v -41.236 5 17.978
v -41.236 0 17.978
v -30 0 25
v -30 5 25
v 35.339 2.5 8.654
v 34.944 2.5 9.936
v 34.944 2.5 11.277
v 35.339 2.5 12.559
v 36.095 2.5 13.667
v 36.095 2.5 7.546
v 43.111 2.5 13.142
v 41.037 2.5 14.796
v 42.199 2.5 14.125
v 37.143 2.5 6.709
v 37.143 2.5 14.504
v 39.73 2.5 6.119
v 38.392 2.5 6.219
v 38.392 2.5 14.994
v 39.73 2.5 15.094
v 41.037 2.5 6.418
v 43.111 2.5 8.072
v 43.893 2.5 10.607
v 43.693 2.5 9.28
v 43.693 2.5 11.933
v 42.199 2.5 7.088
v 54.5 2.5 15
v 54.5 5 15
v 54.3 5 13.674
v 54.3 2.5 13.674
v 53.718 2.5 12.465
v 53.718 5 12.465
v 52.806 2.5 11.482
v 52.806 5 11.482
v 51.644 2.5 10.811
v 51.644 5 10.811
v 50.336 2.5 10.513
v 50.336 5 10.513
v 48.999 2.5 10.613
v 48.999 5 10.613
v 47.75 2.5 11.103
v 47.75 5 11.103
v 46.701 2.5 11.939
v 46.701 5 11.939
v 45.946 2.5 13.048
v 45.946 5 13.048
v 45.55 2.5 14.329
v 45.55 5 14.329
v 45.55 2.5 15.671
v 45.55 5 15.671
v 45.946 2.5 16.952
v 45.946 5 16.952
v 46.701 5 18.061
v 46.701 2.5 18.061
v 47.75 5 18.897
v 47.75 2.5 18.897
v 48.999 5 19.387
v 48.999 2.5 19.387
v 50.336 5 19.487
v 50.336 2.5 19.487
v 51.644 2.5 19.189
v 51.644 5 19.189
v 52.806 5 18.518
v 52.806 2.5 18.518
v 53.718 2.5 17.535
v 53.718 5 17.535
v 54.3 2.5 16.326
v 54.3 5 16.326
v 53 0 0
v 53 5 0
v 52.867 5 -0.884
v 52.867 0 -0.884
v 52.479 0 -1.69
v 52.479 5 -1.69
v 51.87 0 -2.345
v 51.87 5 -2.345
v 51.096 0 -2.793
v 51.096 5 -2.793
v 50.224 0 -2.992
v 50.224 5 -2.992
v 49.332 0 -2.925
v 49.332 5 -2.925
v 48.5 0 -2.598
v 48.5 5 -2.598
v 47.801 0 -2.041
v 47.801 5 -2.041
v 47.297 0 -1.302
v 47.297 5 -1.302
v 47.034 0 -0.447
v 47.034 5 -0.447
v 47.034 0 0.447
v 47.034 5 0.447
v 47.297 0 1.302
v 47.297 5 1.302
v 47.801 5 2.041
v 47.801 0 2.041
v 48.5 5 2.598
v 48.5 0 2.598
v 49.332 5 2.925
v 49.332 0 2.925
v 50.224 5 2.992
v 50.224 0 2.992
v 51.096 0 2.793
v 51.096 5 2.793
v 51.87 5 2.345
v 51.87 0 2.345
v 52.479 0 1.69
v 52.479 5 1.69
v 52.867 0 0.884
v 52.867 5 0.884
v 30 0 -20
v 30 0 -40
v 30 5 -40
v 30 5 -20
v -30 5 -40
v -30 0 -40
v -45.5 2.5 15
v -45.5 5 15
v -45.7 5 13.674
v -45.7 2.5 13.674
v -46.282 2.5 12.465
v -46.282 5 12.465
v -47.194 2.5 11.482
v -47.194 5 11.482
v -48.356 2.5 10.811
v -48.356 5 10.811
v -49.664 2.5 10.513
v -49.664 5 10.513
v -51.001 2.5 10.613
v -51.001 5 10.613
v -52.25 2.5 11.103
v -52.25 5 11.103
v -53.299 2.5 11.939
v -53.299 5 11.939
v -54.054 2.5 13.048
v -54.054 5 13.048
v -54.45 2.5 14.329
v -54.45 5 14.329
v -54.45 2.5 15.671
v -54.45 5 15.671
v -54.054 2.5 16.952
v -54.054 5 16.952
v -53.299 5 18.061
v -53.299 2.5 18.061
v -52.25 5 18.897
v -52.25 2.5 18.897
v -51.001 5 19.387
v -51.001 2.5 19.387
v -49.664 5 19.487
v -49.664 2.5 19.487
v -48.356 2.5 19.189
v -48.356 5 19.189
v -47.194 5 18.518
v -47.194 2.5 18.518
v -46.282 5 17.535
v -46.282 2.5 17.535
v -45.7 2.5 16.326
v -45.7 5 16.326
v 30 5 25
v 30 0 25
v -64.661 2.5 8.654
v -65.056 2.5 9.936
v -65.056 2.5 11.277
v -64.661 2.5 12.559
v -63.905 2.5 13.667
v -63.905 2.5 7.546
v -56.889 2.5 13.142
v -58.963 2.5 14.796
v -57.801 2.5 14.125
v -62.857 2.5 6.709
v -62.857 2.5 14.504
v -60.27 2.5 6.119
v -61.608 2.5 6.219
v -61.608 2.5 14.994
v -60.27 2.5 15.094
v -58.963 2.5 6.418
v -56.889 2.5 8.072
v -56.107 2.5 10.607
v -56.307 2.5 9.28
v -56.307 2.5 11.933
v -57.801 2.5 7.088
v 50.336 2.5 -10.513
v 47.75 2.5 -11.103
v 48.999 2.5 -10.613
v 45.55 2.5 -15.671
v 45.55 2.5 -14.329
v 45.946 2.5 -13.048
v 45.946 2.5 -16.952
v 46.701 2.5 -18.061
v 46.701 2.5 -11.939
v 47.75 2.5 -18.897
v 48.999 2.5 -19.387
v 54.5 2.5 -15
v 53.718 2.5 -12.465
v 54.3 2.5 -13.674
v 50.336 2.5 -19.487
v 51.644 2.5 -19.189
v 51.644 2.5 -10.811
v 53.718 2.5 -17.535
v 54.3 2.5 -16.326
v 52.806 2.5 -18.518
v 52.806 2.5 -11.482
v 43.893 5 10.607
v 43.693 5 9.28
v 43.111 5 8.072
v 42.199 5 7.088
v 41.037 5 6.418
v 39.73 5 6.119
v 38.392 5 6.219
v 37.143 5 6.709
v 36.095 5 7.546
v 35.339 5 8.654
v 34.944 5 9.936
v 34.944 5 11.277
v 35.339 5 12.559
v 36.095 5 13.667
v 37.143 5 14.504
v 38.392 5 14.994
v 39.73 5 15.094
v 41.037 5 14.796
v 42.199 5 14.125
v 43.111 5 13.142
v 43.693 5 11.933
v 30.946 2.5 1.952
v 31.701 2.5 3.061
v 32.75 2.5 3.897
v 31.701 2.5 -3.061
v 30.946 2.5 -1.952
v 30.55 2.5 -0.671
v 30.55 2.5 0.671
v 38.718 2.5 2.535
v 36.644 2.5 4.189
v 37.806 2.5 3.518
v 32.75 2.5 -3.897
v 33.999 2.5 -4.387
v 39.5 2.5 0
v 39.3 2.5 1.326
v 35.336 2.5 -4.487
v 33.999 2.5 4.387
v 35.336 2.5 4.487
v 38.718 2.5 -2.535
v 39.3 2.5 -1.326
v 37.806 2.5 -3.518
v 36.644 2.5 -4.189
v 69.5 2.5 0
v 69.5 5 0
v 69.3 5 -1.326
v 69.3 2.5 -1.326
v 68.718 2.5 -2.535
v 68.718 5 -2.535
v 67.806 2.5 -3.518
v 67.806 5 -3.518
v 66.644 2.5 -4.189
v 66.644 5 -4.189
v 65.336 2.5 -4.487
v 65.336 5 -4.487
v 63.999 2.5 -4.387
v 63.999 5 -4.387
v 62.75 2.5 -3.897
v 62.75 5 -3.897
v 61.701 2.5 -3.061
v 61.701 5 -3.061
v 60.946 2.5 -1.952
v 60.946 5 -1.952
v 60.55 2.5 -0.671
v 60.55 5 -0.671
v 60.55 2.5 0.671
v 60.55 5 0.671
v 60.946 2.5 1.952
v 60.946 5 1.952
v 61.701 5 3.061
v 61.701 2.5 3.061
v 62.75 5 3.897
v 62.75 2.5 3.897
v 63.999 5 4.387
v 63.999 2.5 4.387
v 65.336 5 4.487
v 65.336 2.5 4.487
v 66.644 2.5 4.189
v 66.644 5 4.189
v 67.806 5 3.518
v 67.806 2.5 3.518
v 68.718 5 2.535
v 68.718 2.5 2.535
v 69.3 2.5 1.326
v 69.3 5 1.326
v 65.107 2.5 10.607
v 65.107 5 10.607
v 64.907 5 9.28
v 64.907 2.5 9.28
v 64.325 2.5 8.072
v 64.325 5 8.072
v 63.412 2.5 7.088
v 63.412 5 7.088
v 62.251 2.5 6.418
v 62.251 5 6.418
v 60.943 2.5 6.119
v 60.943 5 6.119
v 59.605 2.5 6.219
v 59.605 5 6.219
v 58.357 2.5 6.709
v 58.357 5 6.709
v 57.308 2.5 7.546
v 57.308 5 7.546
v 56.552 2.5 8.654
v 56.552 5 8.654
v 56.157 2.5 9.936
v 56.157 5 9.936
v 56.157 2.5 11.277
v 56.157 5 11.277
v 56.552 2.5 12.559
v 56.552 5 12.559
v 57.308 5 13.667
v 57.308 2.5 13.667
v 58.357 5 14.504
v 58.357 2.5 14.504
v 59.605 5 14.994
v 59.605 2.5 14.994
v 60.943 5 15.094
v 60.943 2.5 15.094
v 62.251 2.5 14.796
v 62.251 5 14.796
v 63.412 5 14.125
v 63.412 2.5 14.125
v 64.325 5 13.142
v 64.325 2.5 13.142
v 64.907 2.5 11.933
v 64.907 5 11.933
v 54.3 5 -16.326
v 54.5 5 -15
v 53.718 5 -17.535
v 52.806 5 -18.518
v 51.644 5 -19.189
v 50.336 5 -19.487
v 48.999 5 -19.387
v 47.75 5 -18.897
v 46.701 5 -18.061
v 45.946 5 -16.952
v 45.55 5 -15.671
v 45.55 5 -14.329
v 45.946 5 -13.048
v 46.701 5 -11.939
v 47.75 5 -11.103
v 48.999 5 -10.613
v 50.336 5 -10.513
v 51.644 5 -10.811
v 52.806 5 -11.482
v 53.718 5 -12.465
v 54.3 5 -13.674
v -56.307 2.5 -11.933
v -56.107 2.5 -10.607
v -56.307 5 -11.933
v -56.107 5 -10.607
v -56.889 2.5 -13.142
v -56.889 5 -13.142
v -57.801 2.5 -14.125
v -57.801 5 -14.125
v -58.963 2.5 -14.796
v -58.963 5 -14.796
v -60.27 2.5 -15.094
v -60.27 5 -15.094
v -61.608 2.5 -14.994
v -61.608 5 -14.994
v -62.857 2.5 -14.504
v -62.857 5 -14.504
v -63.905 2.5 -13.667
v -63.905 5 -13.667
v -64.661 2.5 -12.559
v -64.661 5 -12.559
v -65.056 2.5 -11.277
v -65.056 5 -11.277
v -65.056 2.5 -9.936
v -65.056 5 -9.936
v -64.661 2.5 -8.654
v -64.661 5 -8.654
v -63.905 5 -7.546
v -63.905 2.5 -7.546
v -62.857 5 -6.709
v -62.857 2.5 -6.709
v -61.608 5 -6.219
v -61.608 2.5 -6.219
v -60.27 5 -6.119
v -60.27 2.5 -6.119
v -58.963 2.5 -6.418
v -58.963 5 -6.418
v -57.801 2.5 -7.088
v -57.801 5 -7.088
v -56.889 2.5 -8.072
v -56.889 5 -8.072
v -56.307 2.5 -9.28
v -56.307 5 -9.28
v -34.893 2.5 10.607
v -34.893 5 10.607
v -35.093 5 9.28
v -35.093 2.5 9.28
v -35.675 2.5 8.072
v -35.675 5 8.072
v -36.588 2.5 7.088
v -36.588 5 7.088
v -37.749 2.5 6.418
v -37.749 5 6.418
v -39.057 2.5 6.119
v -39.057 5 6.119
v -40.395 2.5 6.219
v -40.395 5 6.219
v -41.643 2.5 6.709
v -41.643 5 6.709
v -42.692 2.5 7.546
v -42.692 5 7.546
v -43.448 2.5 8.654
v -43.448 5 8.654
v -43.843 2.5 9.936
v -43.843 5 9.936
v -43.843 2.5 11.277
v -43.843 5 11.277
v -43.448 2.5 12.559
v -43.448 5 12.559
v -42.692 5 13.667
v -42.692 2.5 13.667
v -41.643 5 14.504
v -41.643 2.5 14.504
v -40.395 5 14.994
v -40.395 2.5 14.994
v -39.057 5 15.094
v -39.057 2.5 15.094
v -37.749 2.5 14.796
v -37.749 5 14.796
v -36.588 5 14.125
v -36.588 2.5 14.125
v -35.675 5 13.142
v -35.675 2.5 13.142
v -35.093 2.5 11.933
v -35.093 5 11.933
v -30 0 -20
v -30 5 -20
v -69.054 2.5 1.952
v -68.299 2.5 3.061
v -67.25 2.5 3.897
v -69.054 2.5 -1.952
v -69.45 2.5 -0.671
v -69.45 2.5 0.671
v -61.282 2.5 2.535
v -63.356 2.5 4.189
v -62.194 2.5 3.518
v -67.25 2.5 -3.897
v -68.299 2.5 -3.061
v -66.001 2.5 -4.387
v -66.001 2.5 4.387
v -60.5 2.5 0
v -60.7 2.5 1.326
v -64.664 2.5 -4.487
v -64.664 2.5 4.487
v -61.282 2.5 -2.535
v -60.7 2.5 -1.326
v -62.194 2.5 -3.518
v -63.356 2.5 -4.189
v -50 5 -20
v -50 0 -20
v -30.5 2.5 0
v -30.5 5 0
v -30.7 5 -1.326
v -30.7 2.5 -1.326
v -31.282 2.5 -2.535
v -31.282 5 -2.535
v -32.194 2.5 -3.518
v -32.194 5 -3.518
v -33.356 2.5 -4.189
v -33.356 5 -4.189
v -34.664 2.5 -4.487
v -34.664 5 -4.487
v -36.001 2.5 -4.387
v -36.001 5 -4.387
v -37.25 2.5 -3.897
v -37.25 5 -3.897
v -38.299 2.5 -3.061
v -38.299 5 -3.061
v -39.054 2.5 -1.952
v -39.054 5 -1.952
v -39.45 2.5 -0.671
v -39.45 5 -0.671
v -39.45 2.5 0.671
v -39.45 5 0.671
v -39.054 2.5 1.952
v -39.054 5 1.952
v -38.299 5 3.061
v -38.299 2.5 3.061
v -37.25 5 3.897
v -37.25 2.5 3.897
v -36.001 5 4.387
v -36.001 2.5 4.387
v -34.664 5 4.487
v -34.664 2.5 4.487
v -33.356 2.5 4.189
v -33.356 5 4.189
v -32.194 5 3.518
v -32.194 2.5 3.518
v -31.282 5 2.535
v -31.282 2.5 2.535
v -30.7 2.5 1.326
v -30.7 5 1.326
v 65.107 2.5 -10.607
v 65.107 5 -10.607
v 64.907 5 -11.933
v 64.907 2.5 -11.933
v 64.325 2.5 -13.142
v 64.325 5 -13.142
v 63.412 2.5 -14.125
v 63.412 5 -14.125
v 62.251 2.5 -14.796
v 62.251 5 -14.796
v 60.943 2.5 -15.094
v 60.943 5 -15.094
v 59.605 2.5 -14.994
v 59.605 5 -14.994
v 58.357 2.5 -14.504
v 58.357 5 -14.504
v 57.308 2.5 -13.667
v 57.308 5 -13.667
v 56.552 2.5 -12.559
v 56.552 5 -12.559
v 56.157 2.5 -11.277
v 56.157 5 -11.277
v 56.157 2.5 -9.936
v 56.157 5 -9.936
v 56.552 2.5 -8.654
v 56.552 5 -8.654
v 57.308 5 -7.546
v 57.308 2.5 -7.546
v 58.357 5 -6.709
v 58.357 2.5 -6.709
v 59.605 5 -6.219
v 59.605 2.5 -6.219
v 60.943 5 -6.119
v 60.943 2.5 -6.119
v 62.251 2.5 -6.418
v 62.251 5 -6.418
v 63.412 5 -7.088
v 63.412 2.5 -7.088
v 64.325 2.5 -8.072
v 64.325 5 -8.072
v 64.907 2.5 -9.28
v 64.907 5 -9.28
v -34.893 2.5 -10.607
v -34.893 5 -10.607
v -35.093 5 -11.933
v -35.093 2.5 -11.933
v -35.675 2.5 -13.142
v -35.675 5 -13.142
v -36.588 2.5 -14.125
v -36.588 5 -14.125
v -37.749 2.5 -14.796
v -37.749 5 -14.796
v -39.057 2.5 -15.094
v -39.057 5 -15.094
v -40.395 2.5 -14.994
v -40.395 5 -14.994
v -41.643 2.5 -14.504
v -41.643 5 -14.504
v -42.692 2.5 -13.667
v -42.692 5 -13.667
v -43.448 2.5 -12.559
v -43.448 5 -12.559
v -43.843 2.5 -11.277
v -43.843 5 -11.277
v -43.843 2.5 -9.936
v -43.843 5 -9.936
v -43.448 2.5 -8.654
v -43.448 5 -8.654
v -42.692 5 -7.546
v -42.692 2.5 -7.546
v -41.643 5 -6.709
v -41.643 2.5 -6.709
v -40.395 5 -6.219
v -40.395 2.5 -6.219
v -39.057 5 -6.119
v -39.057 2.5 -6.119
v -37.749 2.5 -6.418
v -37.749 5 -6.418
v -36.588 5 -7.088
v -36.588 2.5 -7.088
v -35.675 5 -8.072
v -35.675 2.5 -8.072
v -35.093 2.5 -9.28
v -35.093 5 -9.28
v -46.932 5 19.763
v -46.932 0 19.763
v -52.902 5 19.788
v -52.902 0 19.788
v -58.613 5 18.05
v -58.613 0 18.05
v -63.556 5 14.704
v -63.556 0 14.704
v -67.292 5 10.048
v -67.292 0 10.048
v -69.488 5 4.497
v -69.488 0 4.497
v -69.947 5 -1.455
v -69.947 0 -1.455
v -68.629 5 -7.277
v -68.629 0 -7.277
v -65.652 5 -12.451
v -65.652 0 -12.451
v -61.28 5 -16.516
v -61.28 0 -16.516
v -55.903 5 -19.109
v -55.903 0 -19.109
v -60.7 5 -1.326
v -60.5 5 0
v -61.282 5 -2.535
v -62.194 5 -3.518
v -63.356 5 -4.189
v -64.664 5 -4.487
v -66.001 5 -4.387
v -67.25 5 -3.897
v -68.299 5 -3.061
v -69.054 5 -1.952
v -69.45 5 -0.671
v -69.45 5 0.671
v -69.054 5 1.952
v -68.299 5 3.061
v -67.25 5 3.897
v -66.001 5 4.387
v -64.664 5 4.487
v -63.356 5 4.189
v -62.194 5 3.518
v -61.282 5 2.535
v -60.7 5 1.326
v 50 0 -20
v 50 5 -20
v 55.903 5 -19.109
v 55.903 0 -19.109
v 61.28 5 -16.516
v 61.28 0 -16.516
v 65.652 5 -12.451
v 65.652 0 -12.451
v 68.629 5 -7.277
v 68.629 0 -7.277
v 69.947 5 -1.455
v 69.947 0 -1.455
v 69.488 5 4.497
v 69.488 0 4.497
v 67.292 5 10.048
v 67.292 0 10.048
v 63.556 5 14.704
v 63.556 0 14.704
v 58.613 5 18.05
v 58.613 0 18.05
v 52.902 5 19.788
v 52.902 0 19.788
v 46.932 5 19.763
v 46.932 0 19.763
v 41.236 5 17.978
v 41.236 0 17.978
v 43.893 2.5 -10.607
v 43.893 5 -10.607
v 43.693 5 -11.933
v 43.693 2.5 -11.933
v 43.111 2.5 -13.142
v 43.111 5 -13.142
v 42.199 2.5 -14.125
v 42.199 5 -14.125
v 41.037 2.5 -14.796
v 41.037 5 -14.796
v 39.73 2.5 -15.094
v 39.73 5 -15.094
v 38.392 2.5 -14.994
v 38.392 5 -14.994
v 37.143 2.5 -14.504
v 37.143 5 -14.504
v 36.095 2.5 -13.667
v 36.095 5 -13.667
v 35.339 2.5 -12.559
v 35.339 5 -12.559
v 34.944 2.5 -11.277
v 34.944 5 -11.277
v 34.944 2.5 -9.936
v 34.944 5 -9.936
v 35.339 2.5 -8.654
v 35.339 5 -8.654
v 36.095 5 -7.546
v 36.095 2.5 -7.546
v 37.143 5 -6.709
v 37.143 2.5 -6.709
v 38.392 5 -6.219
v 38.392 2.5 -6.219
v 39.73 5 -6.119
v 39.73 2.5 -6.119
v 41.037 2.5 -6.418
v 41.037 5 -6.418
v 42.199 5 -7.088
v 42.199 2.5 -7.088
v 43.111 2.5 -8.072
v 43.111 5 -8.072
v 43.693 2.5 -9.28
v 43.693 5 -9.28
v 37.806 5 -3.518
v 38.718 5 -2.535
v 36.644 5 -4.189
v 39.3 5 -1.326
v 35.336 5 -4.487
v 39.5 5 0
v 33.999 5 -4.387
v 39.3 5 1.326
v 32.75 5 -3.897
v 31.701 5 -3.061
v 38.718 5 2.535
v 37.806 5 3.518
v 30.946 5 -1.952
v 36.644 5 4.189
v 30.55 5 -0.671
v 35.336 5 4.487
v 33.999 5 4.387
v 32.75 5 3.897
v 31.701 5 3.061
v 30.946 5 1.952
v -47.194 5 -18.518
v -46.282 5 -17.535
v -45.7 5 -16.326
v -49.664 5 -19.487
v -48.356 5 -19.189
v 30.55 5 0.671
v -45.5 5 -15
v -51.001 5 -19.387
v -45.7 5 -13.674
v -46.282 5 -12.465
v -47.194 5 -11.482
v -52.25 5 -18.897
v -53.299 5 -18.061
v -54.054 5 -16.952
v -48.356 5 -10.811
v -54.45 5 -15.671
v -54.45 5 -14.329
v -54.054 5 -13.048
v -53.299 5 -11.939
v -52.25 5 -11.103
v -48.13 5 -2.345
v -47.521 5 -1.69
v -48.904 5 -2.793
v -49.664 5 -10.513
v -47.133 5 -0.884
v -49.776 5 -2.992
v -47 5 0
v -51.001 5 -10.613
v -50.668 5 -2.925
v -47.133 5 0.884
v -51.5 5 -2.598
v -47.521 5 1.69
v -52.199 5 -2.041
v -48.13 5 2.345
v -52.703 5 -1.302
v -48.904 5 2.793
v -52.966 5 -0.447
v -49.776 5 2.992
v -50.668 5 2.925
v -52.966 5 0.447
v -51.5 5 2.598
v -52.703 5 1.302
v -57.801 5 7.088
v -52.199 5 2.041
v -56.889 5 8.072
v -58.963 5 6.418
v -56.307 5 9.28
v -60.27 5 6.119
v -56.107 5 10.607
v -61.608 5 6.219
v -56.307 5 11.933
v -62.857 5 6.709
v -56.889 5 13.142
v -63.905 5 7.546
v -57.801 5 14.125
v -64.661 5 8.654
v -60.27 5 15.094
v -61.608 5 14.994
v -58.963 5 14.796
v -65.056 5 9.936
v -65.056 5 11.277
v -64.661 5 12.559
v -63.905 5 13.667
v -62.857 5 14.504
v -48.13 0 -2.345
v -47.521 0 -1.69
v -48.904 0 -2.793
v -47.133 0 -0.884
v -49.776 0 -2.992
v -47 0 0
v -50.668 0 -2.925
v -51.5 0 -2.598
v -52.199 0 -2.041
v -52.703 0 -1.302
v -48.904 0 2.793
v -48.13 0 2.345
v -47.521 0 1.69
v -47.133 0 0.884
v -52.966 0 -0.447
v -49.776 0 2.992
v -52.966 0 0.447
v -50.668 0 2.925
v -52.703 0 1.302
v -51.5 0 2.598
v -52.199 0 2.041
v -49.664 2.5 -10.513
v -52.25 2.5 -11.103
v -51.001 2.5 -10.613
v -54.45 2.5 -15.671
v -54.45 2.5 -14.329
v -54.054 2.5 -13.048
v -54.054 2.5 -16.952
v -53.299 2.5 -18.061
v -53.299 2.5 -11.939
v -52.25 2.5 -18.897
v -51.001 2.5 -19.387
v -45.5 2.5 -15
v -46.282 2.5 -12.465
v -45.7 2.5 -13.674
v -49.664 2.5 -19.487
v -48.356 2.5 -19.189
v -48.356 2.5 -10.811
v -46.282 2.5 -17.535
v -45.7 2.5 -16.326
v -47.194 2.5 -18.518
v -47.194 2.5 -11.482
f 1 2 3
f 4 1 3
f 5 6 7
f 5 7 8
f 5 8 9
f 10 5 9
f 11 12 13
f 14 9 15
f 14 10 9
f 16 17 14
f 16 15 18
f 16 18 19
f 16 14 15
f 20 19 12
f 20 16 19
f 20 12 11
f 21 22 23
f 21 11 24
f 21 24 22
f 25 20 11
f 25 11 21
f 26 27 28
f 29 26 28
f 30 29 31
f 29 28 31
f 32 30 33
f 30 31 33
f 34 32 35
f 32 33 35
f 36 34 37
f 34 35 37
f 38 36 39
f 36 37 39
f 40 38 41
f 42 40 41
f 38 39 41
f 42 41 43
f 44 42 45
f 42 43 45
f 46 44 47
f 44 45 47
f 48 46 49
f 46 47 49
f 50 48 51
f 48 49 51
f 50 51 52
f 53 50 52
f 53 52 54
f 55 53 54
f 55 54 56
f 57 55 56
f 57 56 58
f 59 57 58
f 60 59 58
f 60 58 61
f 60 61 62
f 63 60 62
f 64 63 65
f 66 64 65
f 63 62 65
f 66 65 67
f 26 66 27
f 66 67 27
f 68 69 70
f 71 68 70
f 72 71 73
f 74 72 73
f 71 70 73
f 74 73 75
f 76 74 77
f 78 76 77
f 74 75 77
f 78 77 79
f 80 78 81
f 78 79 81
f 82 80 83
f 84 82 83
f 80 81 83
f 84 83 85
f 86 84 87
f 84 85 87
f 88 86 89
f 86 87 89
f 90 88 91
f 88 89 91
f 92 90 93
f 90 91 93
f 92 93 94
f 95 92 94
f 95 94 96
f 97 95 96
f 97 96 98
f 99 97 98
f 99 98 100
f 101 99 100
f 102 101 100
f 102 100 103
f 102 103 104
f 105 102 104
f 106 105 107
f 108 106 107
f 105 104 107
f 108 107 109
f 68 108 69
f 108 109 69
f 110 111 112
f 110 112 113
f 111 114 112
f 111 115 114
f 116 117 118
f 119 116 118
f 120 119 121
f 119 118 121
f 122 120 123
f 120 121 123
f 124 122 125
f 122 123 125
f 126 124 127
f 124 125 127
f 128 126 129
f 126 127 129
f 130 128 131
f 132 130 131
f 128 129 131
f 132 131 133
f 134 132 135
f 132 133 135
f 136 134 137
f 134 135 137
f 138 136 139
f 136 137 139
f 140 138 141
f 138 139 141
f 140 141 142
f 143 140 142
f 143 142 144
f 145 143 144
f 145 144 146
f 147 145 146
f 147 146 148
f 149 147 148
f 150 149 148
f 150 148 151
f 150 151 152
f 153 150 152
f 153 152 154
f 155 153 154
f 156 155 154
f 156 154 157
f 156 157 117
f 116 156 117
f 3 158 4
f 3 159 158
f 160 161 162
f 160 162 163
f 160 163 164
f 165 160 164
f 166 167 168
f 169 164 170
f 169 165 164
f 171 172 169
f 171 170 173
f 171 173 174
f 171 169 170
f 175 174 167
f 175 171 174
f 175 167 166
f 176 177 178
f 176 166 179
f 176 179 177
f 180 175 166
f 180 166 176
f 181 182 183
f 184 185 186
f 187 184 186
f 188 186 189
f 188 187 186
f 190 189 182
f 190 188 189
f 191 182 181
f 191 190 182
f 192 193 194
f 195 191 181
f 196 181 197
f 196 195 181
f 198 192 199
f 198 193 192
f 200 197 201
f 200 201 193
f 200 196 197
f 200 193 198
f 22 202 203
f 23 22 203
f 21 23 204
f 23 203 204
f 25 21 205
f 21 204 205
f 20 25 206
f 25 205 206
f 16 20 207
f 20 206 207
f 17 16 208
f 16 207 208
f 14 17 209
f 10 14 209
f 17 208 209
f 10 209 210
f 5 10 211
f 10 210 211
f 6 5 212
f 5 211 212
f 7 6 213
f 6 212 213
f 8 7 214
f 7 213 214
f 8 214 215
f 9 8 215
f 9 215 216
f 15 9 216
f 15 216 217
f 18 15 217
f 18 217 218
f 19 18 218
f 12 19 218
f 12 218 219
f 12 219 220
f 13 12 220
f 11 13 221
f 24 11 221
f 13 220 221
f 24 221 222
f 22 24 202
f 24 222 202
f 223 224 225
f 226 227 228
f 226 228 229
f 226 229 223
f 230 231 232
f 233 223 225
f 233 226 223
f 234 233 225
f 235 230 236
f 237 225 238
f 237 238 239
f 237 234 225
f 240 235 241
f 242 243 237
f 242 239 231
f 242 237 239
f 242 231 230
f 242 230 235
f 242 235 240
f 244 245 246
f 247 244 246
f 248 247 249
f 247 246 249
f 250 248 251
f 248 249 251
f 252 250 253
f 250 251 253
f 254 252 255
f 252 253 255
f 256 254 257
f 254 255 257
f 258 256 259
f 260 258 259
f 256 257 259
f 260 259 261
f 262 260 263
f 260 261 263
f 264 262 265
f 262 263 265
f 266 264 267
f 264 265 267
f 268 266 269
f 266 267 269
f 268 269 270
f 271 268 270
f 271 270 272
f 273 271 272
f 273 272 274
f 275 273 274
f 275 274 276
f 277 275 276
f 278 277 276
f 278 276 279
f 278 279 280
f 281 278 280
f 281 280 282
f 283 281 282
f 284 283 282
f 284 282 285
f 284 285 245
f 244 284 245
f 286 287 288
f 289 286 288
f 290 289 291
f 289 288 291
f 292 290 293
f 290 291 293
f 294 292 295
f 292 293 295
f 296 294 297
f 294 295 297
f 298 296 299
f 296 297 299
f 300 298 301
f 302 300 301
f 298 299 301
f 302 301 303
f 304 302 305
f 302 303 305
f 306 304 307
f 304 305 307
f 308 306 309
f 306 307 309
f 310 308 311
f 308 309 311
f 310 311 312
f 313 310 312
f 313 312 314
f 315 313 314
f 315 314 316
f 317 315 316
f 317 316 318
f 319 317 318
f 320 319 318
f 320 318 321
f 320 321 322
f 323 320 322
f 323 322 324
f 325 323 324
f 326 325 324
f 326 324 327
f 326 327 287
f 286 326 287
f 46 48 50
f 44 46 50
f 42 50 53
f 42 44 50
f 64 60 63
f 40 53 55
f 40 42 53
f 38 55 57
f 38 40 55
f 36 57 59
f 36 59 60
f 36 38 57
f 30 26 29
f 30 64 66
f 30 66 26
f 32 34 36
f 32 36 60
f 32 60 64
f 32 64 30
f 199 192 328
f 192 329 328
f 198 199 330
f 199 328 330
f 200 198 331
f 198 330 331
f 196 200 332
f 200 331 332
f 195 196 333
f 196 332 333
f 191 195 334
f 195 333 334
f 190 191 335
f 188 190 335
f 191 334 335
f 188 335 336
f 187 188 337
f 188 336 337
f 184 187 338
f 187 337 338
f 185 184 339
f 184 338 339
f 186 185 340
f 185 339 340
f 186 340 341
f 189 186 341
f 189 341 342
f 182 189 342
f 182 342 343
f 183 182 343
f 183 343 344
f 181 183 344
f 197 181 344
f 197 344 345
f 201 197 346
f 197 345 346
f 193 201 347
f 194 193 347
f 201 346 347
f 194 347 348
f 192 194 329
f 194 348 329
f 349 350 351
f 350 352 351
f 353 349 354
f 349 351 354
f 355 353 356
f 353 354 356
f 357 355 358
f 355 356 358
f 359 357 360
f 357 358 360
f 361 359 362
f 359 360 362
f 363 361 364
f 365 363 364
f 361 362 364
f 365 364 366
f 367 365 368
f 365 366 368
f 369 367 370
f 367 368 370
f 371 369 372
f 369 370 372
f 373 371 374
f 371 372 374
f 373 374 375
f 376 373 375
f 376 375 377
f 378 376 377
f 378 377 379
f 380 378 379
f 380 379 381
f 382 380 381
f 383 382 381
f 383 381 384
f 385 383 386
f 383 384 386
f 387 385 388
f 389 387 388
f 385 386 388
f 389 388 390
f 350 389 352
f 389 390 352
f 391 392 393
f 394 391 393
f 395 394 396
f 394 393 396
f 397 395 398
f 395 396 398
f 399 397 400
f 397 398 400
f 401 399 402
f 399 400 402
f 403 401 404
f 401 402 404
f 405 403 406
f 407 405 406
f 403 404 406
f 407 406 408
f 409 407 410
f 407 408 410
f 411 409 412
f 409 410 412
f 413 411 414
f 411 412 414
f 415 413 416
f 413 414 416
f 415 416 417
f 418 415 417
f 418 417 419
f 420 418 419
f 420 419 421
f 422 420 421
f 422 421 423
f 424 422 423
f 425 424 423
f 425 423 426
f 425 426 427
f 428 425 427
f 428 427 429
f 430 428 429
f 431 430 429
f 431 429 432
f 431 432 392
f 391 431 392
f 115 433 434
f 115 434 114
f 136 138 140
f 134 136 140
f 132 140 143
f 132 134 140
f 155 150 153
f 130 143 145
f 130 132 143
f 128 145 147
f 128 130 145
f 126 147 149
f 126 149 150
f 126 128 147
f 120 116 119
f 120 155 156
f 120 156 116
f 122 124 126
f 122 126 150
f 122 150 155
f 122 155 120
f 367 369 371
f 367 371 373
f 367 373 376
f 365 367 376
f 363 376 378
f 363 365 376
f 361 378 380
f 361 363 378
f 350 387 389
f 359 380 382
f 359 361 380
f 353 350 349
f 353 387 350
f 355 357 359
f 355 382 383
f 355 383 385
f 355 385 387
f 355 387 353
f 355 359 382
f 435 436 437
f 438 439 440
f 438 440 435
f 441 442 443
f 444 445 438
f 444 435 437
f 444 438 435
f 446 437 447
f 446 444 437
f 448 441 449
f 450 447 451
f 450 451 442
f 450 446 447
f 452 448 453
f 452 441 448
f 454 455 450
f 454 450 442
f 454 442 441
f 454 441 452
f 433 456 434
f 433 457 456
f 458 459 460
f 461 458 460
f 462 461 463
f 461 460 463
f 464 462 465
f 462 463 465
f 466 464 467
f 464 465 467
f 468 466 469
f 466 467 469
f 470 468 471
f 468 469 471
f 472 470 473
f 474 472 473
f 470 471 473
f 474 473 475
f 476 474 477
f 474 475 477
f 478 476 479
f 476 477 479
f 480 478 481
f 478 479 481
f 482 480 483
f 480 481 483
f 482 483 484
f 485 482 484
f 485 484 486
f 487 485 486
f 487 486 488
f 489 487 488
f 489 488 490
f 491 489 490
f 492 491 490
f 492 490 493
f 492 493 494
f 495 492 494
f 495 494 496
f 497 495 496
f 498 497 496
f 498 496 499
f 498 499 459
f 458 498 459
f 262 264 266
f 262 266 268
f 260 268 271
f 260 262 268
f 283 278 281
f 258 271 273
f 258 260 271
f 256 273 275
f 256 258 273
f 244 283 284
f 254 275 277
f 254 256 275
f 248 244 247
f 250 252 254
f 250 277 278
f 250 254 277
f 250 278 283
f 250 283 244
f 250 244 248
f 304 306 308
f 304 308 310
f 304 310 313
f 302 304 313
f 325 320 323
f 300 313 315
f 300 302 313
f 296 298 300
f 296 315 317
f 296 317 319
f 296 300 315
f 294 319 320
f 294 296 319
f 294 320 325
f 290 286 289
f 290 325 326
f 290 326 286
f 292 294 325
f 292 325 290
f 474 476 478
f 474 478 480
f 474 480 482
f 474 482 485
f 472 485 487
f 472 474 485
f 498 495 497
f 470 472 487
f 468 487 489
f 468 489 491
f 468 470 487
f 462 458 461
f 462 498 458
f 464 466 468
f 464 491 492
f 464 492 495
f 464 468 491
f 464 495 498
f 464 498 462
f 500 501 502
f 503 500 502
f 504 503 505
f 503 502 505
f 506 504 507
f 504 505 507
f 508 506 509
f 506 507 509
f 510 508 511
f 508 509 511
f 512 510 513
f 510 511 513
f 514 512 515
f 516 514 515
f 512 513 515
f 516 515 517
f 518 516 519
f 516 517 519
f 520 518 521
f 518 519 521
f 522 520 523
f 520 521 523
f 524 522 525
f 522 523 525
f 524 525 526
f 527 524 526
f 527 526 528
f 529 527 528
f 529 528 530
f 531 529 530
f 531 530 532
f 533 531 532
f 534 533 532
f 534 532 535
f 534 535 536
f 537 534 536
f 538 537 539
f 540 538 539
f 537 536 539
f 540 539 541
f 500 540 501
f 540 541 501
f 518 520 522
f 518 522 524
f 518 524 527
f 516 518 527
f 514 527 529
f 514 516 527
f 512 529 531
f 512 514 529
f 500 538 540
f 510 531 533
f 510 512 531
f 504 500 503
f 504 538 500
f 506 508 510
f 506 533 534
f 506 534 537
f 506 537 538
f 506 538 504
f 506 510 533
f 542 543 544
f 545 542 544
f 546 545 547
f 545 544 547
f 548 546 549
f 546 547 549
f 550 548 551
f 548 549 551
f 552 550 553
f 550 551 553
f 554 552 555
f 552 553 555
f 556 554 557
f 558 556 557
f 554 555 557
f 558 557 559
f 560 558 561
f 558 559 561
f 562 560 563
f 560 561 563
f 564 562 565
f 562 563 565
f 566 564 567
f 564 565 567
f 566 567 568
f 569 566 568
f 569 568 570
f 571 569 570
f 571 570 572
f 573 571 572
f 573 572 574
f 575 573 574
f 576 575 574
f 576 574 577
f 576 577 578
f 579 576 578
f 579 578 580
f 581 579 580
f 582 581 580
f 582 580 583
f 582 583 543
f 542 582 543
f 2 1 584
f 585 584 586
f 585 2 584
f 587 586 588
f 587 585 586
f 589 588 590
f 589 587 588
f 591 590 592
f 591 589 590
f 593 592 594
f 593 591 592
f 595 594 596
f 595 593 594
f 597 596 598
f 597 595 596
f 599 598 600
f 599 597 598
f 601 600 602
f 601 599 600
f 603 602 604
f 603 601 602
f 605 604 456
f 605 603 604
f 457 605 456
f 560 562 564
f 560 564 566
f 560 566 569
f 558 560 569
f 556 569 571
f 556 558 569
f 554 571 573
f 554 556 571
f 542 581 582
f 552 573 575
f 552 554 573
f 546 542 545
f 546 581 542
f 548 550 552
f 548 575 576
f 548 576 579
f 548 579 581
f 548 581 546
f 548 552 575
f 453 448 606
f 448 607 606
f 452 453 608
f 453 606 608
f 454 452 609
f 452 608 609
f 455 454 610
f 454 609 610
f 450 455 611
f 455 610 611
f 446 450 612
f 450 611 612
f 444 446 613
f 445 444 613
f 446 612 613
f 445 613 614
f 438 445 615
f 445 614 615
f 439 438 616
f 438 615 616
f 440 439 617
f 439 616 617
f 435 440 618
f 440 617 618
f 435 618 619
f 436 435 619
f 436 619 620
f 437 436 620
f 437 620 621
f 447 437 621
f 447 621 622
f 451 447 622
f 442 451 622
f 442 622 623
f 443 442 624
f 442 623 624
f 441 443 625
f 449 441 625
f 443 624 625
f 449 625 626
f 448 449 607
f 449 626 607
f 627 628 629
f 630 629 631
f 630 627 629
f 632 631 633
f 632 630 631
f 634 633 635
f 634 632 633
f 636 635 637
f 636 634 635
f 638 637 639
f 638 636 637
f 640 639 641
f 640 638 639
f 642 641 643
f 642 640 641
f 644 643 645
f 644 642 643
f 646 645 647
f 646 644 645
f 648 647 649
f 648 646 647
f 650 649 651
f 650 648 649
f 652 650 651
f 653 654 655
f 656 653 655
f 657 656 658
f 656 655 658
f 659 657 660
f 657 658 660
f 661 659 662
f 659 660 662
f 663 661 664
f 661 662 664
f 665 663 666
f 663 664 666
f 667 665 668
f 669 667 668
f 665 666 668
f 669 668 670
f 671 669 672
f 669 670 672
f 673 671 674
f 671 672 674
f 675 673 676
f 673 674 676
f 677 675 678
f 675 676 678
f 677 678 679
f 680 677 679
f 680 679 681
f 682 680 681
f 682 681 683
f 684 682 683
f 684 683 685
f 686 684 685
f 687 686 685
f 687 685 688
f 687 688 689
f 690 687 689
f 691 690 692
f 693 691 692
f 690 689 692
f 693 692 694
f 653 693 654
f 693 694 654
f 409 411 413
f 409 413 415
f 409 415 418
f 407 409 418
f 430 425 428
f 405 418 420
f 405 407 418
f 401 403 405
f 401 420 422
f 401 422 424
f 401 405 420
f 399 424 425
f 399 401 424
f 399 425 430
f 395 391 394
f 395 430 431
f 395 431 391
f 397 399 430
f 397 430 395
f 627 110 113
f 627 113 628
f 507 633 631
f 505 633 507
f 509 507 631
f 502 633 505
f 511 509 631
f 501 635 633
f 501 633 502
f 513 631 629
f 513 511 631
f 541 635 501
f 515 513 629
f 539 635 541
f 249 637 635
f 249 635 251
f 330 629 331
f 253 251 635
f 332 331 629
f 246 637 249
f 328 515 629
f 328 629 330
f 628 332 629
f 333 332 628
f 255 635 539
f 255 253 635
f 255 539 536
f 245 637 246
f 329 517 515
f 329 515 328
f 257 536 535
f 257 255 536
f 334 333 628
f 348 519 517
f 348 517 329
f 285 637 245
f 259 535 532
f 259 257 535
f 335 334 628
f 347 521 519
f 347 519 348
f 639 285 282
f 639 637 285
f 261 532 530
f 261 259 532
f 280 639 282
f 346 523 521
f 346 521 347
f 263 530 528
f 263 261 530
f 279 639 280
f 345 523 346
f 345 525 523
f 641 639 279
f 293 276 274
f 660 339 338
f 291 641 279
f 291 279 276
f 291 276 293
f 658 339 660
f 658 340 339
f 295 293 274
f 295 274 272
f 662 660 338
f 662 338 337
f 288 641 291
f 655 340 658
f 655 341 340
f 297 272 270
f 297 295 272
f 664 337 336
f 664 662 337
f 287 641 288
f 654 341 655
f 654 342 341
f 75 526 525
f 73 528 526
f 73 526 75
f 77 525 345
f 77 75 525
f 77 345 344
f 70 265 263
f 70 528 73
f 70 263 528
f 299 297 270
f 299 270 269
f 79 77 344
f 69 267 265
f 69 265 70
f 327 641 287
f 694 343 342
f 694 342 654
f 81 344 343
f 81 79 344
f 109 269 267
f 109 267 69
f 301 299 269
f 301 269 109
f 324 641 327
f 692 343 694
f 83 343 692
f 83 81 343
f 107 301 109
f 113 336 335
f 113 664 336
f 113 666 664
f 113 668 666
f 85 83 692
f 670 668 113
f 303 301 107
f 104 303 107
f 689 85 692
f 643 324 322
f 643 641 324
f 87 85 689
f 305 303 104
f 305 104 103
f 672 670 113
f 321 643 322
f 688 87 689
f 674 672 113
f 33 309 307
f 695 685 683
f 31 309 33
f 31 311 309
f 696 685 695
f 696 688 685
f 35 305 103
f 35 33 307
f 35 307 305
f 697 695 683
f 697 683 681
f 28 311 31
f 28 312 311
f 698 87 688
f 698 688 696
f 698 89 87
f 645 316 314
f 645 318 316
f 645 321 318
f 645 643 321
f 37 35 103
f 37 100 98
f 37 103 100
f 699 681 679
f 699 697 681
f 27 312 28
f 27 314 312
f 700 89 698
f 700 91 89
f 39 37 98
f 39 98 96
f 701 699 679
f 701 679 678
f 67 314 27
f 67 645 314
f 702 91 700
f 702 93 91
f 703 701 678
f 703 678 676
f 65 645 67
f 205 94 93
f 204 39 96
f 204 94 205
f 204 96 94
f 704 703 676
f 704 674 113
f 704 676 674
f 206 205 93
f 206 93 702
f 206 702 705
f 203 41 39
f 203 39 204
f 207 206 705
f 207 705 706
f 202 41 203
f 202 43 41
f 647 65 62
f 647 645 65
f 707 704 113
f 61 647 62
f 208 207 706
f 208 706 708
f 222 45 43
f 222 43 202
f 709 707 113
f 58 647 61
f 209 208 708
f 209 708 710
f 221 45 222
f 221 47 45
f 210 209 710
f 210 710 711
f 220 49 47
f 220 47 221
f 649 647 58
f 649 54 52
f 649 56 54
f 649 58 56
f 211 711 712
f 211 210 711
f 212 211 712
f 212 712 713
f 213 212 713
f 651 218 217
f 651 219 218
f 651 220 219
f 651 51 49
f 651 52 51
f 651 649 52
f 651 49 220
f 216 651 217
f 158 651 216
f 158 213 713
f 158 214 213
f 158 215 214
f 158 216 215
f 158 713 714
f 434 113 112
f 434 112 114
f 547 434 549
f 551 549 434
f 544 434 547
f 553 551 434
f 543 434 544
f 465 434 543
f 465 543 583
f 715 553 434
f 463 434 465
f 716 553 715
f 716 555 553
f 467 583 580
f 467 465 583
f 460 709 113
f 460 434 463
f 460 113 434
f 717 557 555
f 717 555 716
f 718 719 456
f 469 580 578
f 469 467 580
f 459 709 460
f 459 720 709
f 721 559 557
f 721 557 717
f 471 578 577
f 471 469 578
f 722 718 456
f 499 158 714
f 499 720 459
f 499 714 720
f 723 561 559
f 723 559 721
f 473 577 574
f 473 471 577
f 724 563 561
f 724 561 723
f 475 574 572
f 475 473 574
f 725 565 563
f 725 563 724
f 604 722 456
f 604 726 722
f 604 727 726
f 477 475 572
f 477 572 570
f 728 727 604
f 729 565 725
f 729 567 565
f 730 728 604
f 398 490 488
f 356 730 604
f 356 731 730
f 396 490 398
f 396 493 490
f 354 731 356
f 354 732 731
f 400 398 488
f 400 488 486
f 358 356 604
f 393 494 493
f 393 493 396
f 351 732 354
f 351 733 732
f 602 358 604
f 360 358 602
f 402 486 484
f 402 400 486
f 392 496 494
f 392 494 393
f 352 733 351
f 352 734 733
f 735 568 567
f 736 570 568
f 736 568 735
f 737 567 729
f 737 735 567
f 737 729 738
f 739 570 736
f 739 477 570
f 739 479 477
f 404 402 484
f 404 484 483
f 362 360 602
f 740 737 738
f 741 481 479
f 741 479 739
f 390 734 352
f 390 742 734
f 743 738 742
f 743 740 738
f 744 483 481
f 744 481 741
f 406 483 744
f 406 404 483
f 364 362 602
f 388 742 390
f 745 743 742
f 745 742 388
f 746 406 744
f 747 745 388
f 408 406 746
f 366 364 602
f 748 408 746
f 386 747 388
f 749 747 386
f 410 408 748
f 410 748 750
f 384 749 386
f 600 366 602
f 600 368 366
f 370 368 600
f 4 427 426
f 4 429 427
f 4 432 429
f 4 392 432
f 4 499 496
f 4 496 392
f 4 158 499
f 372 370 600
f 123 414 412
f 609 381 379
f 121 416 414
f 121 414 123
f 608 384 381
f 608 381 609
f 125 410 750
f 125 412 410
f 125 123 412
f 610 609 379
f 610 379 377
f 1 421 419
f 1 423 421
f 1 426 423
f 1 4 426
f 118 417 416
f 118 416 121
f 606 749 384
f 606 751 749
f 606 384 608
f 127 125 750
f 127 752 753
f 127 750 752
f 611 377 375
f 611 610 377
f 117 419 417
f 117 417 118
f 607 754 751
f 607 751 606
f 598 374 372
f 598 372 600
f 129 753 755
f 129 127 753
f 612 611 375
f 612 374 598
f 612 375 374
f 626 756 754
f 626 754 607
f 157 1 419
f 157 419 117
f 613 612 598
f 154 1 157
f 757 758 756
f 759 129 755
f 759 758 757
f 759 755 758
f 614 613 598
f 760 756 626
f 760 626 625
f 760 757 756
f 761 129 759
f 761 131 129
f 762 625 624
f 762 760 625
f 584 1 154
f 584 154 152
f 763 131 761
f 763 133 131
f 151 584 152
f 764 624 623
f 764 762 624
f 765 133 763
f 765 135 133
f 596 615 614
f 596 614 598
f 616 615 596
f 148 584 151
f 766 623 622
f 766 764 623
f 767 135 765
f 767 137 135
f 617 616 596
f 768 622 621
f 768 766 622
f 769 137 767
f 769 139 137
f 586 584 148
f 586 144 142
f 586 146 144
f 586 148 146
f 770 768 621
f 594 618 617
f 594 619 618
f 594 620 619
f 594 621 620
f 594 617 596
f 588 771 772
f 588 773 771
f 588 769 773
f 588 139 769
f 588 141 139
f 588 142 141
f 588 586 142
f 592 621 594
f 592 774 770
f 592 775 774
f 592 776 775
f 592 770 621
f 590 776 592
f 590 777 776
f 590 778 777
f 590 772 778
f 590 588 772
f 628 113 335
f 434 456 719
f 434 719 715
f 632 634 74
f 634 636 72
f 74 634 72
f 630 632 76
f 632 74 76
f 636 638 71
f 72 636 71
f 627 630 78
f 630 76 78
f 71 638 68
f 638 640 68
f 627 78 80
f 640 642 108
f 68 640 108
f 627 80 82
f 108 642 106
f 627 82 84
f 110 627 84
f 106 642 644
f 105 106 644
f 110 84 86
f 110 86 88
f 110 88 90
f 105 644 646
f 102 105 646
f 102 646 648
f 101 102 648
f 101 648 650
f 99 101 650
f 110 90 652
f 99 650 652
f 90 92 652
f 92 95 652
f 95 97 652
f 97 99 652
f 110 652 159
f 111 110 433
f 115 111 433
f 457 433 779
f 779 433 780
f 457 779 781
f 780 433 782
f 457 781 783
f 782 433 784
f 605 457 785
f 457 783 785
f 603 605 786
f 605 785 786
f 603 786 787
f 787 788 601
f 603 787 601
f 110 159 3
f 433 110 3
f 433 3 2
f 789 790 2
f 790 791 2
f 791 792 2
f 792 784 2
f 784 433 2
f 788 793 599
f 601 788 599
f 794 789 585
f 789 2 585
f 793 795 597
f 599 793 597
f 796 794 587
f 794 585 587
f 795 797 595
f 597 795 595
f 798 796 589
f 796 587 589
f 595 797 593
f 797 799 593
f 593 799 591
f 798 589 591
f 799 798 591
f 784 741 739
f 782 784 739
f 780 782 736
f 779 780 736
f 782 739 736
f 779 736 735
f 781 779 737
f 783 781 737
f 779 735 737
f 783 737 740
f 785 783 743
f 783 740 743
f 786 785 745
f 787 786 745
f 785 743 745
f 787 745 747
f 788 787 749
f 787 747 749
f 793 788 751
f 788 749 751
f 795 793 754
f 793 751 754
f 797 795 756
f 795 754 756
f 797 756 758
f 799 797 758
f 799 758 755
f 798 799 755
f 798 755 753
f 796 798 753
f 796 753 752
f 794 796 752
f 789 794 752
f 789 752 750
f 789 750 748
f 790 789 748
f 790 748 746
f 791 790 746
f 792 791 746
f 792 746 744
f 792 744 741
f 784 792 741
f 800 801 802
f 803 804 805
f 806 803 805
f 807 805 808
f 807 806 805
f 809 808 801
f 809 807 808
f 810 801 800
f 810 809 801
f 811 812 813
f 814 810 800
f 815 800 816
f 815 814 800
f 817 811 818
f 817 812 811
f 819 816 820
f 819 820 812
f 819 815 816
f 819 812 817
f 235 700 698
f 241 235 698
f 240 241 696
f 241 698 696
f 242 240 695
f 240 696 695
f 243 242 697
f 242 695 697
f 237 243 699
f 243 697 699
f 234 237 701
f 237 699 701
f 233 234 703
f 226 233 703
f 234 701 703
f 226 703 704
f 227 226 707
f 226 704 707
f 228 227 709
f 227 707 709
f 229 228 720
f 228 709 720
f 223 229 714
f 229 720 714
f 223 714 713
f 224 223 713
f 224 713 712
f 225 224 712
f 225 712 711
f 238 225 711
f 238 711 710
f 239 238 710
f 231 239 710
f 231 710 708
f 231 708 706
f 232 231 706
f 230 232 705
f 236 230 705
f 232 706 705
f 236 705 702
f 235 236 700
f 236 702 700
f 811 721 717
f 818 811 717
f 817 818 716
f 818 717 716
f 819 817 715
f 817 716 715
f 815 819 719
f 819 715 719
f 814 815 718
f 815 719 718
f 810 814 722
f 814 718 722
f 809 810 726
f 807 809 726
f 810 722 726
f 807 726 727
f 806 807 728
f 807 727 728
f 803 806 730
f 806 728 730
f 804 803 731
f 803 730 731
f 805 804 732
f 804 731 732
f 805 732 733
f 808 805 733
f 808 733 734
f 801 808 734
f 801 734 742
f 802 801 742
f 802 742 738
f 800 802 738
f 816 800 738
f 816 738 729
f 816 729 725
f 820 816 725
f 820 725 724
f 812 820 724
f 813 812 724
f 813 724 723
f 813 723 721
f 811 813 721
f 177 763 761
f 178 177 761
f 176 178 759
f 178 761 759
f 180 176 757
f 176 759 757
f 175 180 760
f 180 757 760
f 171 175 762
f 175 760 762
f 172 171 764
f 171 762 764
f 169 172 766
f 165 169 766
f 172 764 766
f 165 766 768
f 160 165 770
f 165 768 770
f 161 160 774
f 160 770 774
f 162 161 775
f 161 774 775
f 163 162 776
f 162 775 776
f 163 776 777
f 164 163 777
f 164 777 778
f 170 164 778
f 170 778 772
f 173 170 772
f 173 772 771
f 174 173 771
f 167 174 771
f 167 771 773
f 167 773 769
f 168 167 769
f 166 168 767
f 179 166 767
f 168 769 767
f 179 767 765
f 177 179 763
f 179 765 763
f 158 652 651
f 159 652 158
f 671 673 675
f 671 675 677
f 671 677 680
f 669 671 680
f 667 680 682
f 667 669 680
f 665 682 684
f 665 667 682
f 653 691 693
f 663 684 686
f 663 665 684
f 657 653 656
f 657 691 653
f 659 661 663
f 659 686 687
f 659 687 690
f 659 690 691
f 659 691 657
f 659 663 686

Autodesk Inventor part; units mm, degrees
ref_plane "YZ Plane" through (0, 0, 0) normal (1, 0, 0) x (0, 1, 0)
ref_plane "XZ Plane" through (0, 0, 0) normal (0, 1, 0) x (-1, 0, 0)
ref_plane "XY Plane" through (0, 0, 0) normal (0, 0, 1) x (1, 0, 0)
sketch "Esquisse1" plane through (0, 0, 0) normal (0, 1, 0) x (-1, 0, 0)
  line L0 (-30, 25) -> (30, 25)
  line L1 (30, 25) -> (30, -40)
  line L2 (30, -40) -> (-30, -40)
  line L3 (-30, -40) -> (-30, 25)
  line L4 (-30, 25) -> (-70, 25) construction
  line L5 (-70, 25) -> (-70, 0) construction
  line L6 (-70, 0) -> (-30, 0) construction
  line L7 (-30, 0) -> (-30, 25) construction
  line L8 (30, 25) -> (70, 25) construction
  line L9 (70, 25) -> (70, 0) construction
  line L10 (70, 0) -> (30, 0) construction
  line L11 (30, 0) -> (30, 25) construction
  line L12 (-50, 0) -> (50, 0) construction
  line L13 (50, 0) -> (50, -40) construction
  line L14 (50, -40) -> (-50, -40) construction
  line L15 (-50, -40) -> (-50, 0) construction
  circle A0 centre (-50, 0) radius 20
  circle A1 centre (50, 0) radius 20
  line L16 (-70, 0) -> (-30, 25)
  line L17 (70, 0) -> (30, 25)
  line L18 (50, -20) -> (-50, -20)
  line L19 (-70, 0) -> (-50, -20)
  line L20 (50, -20) -> (70, 0)
  point P0 (0, 0)
  dimension "d8" = 40
  dimension "d9" = 40
  dimension "d0" = 25
  dimension "d1" = 140
  dimension "d2" = 60
  dimension "d3" = 65
  dimension "d4" = 30
  dimension "d5" = 25
  dimension "d6" = 100
  dimension "d7" = 50
  dimension "d10" = 70
extrude "Extrusion1" add sketch "Esquisse1" along normal blind 5
sketch "Esquisse2" plane through (0, 5, 0) normal (0, 1, 0) x (1, 0, 0)
  arc A0 (41.236, -17.9775) -> (50, 20) centre (50, 0) ccw projected
  arc A1 (-50, 20) -> (-41.236, -17.9775) centre (-50, 0) ccw projected
  circle A2 centre (-50, 0) radius 3
  circle A3 centre (50, 0) radius 3
  point P0 (0, 0)
  dimension "d13" = 6
  dimension "d14" = 6
extrude "Extrusion2" cut sketch "Esquisse2" against normal through all
sketch "Esquisse3" plane through (0, 5, 0) normal (0, 1, 0) x (1, 0, 0)
  circle A0 centre (-50, 0) radius 3 projected
  circle A1 centre (50, 0) radius 3 projected
  line L0 (30, 40) -> (-30, 40) projected
  arc A2 (-50, 20) -> (-41.236, -17.9775) centre (-50, 0) ccw projected
  line L1 (0, 0) -> (0, 40) construction
  line L2 (-50, 0) -> (-50, 20) construction
  circle A3 centre (-50, 0) radius 15 construction
  circle A4 centre (-50, 15) radius 4.5
  circle A5 centre (50, 15) radius 4.5
  circle A6 centre (-60.6066, 10.6066) radius 4.5
  circle A7 centre (-65, 0) radius 4.5
  circle A8 centre (-60.6066, -10.6066) radius 4.5
  circle A9 centre (-50, -15) radius 4.5
  circle A10 centre (-39.3934, -10.6066) radius 4.5
  circle A11 centre (-35, 0) radius 4.5
  circle A12 centre (-39.3934, 10.6066) radius 4.5
  circle A13 centre (39.3934, 10.6066) radius 4.5
  circle A14 centre (35, 0) radius 4.5
  circle A15 centre (39.3934, -10.6066) radius 4.5
  circle A16 centre (50, -15) radius 4.5
  circle A17 centre (60.6066, -10.6066) radius 4.5
  circle A18 centre (65, 0) radius 4.5
  circle A19 centre (60.6066, 10.6066) radius 4.5
  dimension "d17" = 30
  dimension "d18" = 9
  dimension "d21" = 360
  dimension "d25" = 360
extrude "Extrusion3" cut sketch "Esquisse3" against normal blind 2.5 contours A4 | A5 | A6 | A7 | A8 | A9 | A10 | A11 | A12 | A13 | A14 | A15 | A16 | A17 | A18 | A19
equation "\"d9\" = d8"
equation "\"d4\" = 0.5 * d2"
equation "\"d5\" = d0"
equation "\"d7\" = 0.5 * d6"
equation "\"d10\" = 0.5 * d1"
equation "\"d14\" = d13"
properties part number "support_puissance"
